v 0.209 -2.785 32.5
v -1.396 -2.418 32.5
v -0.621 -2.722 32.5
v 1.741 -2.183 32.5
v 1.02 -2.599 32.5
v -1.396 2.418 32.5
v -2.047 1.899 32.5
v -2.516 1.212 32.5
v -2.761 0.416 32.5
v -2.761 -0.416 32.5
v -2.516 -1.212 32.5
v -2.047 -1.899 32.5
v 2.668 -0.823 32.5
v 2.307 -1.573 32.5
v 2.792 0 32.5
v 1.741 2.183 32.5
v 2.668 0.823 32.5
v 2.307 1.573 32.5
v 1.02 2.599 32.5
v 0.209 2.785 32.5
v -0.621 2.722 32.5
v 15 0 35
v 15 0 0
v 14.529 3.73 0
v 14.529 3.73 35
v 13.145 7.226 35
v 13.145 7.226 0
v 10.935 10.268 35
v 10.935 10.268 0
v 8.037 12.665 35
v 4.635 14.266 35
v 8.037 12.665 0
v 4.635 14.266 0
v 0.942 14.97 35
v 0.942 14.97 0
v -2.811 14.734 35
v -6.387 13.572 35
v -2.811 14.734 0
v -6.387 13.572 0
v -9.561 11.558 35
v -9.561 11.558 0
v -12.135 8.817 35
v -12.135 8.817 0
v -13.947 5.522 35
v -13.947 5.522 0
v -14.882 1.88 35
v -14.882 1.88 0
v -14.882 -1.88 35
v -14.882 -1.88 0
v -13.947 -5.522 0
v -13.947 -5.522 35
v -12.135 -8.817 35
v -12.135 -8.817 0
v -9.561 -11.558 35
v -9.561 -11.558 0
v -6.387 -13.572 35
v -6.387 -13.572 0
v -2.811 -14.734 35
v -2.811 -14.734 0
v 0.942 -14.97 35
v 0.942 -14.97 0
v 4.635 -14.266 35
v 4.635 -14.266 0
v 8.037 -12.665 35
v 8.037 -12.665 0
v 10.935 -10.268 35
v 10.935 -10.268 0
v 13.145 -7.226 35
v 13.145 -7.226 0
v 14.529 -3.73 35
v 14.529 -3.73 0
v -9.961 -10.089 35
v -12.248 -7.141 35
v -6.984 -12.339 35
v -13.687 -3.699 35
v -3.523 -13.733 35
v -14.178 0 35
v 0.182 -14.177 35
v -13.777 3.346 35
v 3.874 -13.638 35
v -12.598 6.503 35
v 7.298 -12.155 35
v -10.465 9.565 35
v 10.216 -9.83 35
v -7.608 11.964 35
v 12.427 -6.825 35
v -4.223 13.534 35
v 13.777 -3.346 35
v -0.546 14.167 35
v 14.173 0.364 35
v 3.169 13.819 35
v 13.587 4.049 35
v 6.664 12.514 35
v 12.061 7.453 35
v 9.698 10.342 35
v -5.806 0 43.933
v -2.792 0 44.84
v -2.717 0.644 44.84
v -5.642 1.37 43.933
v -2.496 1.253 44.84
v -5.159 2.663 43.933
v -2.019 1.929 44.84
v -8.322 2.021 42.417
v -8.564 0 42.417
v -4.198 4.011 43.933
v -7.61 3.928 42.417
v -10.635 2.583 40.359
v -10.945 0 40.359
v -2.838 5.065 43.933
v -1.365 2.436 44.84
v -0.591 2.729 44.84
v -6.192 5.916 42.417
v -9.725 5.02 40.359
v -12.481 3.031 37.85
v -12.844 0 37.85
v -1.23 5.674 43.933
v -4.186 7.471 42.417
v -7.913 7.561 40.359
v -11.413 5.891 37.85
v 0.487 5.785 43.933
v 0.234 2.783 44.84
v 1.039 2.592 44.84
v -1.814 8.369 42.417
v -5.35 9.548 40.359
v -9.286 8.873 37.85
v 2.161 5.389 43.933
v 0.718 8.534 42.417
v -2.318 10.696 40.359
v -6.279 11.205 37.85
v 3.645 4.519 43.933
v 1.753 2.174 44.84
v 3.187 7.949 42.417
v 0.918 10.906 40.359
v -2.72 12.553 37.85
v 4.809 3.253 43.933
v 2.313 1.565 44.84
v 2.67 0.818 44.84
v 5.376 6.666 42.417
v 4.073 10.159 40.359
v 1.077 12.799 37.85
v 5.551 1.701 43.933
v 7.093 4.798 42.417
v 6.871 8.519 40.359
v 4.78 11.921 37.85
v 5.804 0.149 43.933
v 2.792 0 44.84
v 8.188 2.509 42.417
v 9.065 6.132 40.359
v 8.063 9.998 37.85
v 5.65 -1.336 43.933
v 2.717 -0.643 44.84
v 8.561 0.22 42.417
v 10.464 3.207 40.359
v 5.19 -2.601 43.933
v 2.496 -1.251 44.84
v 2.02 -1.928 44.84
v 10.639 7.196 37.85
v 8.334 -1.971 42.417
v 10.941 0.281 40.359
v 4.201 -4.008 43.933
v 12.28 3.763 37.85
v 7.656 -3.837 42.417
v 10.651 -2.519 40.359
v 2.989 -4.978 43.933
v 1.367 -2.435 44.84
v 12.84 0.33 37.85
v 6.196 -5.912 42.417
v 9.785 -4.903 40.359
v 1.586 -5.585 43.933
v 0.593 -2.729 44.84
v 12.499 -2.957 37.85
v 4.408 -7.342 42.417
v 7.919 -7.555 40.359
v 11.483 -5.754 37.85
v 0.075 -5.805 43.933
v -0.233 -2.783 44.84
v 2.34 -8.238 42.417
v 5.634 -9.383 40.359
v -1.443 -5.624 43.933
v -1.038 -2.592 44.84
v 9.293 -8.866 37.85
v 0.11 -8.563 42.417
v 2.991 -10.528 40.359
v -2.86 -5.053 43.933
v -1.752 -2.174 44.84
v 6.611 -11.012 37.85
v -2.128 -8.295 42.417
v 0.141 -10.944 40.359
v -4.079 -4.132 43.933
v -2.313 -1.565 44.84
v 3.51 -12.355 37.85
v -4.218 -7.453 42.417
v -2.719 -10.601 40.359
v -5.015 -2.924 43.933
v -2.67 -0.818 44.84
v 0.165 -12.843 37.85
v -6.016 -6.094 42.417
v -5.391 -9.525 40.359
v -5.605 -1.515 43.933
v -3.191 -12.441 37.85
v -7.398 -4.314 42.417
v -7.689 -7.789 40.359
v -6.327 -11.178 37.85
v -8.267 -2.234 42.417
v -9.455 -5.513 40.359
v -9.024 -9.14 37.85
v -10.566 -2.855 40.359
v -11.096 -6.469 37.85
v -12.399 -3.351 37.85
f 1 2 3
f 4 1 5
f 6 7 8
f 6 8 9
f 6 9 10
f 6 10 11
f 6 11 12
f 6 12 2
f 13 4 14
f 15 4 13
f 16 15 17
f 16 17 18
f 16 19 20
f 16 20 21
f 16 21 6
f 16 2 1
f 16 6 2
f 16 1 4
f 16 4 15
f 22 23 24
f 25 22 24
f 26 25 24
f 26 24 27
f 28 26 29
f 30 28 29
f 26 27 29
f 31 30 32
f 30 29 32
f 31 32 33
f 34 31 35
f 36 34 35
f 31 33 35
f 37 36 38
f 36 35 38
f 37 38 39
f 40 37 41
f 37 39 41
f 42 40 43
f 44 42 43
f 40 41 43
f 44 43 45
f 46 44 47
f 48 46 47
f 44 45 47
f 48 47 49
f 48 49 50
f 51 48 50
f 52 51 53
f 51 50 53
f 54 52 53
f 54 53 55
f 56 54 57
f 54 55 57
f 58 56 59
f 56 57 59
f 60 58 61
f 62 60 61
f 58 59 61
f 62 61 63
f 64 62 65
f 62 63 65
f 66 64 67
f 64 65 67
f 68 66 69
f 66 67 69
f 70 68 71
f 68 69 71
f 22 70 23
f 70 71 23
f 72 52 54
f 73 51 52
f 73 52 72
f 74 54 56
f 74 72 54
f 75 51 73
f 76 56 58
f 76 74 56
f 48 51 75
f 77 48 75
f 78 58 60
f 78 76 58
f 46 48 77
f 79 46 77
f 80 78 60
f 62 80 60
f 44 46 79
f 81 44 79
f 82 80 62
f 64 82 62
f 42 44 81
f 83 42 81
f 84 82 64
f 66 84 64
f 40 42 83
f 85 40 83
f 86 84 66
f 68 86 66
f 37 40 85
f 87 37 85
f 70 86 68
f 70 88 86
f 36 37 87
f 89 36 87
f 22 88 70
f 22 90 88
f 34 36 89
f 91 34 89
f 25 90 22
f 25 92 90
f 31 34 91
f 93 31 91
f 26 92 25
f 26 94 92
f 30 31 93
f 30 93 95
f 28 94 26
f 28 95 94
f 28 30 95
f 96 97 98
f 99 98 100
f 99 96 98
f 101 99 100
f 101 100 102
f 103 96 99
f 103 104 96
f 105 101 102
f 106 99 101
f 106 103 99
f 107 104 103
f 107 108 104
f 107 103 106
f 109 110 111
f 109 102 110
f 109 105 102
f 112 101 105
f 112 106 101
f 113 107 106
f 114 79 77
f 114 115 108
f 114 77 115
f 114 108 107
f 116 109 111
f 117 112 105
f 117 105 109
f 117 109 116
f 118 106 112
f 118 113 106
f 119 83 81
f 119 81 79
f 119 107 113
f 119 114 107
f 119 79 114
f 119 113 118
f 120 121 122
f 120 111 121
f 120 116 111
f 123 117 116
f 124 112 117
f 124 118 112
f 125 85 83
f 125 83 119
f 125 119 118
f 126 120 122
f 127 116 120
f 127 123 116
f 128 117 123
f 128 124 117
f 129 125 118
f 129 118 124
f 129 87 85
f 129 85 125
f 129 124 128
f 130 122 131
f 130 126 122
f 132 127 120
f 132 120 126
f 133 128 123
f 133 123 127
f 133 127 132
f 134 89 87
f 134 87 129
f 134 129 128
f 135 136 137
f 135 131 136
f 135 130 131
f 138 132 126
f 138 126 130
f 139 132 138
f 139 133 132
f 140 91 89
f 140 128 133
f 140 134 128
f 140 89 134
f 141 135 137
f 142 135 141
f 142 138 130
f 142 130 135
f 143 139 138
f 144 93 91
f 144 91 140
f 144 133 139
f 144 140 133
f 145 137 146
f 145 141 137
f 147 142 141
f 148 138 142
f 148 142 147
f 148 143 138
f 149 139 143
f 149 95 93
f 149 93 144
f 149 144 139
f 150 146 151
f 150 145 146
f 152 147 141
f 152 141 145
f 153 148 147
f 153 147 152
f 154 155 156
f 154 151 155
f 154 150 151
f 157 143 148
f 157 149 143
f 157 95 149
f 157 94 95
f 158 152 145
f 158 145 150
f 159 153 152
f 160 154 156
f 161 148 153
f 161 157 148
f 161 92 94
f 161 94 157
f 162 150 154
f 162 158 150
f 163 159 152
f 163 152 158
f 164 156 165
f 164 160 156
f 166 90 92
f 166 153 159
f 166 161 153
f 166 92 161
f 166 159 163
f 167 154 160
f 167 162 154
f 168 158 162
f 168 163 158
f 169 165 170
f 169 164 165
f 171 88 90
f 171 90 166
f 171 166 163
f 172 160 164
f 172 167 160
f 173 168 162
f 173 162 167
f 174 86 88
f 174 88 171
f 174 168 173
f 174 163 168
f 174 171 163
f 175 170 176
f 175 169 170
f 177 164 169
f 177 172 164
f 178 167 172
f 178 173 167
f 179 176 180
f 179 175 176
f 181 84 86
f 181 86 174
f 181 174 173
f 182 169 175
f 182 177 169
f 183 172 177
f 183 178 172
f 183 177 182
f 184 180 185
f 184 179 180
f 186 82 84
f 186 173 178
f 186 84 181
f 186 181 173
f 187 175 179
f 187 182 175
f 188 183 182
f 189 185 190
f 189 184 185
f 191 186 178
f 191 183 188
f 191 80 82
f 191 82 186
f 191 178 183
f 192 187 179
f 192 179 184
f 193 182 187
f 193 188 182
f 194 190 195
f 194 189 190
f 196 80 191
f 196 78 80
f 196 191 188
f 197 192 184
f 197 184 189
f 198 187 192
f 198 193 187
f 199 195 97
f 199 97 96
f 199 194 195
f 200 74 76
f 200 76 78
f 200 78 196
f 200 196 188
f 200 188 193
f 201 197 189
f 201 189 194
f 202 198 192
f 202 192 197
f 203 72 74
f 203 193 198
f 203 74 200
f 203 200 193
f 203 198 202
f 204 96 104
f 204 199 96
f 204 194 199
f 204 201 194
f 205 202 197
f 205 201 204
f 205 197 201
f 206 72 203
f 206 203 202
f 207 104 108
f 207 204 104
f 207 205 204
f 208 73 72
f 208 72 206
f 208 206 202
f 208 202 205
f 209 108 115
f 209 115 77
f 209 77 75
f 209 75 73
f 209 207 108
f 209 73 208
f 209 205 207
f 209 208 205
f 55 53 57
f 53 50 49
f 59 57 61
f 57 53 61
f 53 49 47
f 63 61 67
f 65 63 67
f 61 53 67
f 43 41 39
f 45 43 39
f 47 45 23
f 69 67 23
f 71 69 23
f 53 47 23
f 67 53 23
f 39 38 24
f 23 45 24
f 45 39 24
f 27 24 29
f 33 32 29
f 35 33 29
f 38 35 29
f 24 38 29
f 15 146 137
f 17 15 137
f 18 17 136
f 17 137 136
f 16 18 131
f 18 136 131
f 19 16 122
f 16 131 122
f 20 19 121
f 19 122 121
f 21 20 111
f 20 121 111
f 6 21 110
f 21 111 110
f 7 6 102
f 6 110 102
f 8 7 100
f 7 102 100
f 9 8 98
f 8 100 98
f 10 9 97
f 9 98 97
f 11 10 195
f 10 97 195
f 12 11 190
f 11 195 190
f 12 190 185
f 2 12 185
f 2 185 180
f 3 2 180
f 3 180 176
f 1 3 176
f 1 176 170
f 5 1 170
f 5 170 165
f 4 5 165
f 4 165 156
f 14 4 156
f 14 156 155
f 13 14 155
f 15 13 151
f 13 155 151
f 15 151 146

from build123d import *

# Parameters (mm, degrees)
F0_R     = 15
F1_DEPTH = 35
F5_R     = 2.792343
F6_DEPTH = 20


with BuildPart() as f1:
    # F0 (on Top) → F1 (new body)
    with BuildSketch(Plane.XY):
        Circle(F0_R)
    extrude(amount=F1_DEPTH)

    # F2 (on Front) → F3 (revolve)
    with BuildSketch(Plane.XZ):
        with BuildLine():
            Line((0, 29.952514), (0, 45.102068))
            ThreePointArc((0, 45.102068), (-10.659346, 40.655662), (-14.999254, 29.952514))
            Line((-14.999254, 29.952514), (0, 29.952514))
        make_face()
    revolve(axis=Axis((0, 0, 30.102068), (0, 0, -1)))

    # F5 (on offset) → F6 (cut)
    with BuildSketch(Plane.XY.offset(52.5)):
        Circle(F5_R)
    extrude(amount=-F6_DEPTH, mode=Mode.SUBTRACT)


solid = f1.part
